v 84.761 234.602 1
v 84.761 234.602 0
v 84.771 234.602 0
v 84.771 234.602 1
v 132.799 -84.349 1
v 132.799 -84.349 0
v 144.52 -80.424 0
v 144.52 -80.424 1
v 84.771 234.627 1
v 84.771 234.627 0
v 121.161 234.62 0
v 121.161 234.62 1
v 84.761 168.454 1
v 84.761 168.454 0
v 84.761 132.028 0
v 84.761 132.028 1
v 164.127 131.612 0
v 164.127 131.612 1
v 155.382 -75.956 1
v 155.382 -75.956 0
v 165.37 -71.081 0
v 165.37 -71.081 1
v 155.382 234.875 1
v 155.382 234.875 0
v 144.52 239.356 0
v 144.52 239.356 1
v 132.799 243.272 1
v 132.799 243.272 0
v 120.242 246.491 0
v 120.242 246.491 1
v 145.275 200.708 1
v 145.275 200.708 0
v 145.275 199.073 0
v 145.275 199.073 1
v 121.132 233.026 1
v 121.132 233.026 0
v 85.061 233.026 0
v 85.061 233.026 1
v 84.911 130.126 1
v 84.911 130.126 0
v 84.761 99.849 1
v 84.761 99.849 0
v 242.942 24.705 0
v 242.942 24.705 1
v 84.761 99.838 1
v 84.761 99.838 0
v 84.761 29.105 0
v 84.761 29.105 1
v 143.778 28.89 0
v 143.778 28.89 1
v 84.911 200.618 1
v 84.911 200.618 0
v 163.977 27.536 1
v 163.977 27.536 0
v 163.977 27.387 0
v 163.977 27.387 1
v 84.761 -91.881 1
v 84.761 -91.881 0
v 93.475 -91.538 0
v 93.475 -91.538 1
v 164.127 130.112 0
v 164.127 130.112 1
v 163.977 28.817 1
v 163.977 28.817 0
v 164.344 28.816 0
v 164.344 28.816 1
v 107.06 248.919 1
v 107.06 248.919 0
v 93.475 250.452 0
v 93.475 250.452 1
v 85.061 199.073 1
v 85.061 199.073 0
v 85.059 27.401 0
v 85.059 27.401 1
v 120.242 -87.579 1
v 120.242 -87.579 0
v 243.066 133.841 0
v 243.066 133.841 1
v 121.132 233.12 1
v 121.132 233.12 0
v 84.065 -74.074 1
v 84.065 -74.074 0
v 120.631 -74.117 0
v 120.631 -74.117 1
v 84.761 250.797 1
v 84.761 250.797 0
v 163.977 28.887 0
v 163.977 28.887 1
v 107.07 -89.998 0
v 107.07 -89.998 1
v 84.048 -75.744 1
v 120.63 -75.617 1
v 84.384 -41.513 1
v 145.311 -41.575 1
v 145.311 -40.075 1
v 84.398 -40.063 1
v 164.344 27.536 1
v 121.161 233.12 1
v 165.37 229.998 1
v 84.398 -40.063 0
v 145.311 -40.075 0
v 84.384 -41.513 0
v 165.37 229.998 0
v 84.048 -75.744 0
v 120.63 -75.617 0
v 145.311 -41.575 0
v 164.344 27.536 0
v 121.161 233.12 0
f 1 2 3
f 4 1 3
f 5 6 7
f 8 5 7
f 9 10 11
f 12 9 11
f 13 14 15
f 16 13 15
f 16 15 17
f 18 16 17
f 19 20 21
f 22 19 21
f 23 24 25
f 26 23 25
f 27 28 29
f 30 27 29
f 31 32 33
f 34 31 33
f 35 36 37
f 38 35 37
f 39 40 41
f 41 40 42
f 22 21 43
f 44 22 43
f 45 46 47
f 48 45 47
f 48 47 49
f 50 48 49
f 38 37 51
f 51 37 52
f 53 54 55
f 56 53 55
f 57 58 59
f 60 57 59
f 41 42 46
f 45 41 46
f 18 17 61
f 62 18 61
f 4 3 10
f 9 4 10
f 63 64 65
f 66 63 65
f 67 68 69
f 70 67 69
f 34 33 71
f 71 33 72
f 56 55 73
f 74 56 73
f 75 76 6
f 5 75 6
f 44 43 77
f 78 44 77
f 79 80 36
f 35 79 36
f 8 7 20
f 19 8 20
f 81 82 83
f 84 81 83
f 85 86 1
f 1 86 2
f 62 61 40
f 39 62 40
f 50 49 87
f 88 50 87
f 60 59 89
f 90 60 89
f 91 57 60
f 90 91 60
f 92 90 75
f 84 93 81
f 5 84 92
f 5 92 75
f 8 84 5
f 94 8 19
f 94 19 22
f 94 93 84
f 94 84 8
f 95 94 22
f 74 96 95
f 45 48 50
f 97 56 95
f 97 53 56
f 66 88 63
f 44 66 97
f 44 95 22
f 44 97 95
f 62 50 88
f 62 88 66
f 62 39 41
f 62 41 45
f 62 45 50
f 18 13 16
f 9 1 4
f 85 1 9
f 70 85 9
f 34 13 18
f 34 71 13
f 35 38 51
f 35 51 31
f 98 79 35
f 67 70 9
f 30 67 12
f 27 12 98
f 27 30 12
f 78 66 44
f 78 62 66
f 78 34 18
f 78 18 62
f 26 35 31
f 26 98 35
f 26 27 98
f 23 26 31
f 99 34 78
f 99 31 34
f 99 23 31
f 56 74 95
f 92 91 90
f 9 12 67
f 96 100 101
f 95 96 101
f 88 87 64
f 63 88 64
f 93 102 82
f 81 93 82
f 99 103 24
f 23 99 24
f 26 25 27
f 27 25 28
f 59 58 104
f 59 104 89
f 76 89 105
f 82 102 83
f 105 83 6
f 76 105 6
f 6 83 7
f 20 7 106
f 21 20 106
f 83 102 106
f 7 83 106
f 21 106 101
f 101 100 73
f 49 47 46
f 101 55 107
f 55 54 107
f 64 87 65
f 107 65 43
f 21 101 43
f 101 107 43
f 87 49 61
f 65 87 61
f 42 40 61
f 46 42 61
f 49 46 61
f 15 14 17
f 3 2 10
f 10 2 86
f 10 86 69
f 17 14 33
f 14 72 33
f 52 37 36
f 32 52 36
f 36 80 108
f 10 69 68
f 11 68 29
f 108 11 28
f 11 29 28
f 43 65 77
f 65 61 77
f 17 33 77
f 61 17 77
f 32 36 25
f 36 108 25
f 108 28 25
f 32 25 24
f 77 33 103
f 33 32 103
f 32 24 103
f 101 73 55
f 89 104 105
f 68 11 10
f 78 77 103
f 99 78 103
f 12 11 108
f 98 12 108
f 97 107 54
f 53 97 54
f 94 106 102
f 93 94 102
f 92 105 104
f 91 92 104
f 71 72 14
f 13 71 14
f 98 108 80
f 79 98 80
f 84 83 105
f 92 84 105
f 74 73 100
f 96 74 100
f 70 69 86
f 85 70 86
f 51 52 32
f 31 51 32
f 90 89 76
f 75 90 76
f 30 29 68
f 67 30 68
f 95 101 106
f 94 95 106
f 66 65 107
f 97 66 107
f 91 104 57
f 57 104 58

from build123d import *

# Parameters (mm, degrees)
F1_DEPTH = 1


# Not quite as in the source:
# - ends of sketch curves that miss each other by under 0.0002 mm in the source are joined


with BuildPart() as f1:
    # F0 (on Top) → F1 (new body)
    with BuildSketch(Plane.XY):
        Polygon((84.760502, 99.838331), (84.760502, 65.532372), (84.760502, 29.104707), (143.7776135408, 28.8903586668), (163.977411, 28.886699), (163.977411, 28.816993624), (164.3435, 28.815664), (164.3435, 27.535789), (163.977411, 27.535789), (163.977411, 27.386699), (85.0591829073, 27.400996887), (84.3979659422, -40.0634812645), (145.310694, -40.074967), (145.31063, -41.574967), (84.3837574867, -41.5131809608), (84.0646295035, -74.0740558181), (120.630506, -74.117418), (120.630358, -75.617418), (84.0482665226, -75.7435834112), (84.760502, -91.880651), (93.474501, -91.537649), (107.070486, -89.99767), (120.241516, -87.578631), (132.799484, -84.348639), (144.519505, -80.423663), (155.382483, -75.955654), (165.369519, -71.08065), (242.942492, 24.705363), (243.065503, 133.841338), (165.369519, 229.998345), (155.382483, 234.875351), (144.519505, 239.356344), (132.799484, 243.272341), (120.241516, 246.491352), (107.059515, 248.919369), (93.474501, 250.452351), (84.760502, 250.797334), (84.760502, 234.60194), (84.7707435172, 234.6018600186), (84.770746, 234.626524), (121.161056, 234.620025), (121.160905, 233.120025), (121.132491, 233.1200300745), (121.132491, 233.026024), (85.060504, 233.026024), (84.910536, 200.618297), (145.27452, 200.708488), (145.27452, 199.072799), (85.060504, 199.072799), (84.760502, 168.454341), (84.760502, 132.02771), (164.127413, 131.611891), (164.127413, 130.111891), (84.910503, 130.126243), (84.7605566, 99.8493557296), align=None)
    extrude(amount=F1_DEPTH)


solid = f1.part
